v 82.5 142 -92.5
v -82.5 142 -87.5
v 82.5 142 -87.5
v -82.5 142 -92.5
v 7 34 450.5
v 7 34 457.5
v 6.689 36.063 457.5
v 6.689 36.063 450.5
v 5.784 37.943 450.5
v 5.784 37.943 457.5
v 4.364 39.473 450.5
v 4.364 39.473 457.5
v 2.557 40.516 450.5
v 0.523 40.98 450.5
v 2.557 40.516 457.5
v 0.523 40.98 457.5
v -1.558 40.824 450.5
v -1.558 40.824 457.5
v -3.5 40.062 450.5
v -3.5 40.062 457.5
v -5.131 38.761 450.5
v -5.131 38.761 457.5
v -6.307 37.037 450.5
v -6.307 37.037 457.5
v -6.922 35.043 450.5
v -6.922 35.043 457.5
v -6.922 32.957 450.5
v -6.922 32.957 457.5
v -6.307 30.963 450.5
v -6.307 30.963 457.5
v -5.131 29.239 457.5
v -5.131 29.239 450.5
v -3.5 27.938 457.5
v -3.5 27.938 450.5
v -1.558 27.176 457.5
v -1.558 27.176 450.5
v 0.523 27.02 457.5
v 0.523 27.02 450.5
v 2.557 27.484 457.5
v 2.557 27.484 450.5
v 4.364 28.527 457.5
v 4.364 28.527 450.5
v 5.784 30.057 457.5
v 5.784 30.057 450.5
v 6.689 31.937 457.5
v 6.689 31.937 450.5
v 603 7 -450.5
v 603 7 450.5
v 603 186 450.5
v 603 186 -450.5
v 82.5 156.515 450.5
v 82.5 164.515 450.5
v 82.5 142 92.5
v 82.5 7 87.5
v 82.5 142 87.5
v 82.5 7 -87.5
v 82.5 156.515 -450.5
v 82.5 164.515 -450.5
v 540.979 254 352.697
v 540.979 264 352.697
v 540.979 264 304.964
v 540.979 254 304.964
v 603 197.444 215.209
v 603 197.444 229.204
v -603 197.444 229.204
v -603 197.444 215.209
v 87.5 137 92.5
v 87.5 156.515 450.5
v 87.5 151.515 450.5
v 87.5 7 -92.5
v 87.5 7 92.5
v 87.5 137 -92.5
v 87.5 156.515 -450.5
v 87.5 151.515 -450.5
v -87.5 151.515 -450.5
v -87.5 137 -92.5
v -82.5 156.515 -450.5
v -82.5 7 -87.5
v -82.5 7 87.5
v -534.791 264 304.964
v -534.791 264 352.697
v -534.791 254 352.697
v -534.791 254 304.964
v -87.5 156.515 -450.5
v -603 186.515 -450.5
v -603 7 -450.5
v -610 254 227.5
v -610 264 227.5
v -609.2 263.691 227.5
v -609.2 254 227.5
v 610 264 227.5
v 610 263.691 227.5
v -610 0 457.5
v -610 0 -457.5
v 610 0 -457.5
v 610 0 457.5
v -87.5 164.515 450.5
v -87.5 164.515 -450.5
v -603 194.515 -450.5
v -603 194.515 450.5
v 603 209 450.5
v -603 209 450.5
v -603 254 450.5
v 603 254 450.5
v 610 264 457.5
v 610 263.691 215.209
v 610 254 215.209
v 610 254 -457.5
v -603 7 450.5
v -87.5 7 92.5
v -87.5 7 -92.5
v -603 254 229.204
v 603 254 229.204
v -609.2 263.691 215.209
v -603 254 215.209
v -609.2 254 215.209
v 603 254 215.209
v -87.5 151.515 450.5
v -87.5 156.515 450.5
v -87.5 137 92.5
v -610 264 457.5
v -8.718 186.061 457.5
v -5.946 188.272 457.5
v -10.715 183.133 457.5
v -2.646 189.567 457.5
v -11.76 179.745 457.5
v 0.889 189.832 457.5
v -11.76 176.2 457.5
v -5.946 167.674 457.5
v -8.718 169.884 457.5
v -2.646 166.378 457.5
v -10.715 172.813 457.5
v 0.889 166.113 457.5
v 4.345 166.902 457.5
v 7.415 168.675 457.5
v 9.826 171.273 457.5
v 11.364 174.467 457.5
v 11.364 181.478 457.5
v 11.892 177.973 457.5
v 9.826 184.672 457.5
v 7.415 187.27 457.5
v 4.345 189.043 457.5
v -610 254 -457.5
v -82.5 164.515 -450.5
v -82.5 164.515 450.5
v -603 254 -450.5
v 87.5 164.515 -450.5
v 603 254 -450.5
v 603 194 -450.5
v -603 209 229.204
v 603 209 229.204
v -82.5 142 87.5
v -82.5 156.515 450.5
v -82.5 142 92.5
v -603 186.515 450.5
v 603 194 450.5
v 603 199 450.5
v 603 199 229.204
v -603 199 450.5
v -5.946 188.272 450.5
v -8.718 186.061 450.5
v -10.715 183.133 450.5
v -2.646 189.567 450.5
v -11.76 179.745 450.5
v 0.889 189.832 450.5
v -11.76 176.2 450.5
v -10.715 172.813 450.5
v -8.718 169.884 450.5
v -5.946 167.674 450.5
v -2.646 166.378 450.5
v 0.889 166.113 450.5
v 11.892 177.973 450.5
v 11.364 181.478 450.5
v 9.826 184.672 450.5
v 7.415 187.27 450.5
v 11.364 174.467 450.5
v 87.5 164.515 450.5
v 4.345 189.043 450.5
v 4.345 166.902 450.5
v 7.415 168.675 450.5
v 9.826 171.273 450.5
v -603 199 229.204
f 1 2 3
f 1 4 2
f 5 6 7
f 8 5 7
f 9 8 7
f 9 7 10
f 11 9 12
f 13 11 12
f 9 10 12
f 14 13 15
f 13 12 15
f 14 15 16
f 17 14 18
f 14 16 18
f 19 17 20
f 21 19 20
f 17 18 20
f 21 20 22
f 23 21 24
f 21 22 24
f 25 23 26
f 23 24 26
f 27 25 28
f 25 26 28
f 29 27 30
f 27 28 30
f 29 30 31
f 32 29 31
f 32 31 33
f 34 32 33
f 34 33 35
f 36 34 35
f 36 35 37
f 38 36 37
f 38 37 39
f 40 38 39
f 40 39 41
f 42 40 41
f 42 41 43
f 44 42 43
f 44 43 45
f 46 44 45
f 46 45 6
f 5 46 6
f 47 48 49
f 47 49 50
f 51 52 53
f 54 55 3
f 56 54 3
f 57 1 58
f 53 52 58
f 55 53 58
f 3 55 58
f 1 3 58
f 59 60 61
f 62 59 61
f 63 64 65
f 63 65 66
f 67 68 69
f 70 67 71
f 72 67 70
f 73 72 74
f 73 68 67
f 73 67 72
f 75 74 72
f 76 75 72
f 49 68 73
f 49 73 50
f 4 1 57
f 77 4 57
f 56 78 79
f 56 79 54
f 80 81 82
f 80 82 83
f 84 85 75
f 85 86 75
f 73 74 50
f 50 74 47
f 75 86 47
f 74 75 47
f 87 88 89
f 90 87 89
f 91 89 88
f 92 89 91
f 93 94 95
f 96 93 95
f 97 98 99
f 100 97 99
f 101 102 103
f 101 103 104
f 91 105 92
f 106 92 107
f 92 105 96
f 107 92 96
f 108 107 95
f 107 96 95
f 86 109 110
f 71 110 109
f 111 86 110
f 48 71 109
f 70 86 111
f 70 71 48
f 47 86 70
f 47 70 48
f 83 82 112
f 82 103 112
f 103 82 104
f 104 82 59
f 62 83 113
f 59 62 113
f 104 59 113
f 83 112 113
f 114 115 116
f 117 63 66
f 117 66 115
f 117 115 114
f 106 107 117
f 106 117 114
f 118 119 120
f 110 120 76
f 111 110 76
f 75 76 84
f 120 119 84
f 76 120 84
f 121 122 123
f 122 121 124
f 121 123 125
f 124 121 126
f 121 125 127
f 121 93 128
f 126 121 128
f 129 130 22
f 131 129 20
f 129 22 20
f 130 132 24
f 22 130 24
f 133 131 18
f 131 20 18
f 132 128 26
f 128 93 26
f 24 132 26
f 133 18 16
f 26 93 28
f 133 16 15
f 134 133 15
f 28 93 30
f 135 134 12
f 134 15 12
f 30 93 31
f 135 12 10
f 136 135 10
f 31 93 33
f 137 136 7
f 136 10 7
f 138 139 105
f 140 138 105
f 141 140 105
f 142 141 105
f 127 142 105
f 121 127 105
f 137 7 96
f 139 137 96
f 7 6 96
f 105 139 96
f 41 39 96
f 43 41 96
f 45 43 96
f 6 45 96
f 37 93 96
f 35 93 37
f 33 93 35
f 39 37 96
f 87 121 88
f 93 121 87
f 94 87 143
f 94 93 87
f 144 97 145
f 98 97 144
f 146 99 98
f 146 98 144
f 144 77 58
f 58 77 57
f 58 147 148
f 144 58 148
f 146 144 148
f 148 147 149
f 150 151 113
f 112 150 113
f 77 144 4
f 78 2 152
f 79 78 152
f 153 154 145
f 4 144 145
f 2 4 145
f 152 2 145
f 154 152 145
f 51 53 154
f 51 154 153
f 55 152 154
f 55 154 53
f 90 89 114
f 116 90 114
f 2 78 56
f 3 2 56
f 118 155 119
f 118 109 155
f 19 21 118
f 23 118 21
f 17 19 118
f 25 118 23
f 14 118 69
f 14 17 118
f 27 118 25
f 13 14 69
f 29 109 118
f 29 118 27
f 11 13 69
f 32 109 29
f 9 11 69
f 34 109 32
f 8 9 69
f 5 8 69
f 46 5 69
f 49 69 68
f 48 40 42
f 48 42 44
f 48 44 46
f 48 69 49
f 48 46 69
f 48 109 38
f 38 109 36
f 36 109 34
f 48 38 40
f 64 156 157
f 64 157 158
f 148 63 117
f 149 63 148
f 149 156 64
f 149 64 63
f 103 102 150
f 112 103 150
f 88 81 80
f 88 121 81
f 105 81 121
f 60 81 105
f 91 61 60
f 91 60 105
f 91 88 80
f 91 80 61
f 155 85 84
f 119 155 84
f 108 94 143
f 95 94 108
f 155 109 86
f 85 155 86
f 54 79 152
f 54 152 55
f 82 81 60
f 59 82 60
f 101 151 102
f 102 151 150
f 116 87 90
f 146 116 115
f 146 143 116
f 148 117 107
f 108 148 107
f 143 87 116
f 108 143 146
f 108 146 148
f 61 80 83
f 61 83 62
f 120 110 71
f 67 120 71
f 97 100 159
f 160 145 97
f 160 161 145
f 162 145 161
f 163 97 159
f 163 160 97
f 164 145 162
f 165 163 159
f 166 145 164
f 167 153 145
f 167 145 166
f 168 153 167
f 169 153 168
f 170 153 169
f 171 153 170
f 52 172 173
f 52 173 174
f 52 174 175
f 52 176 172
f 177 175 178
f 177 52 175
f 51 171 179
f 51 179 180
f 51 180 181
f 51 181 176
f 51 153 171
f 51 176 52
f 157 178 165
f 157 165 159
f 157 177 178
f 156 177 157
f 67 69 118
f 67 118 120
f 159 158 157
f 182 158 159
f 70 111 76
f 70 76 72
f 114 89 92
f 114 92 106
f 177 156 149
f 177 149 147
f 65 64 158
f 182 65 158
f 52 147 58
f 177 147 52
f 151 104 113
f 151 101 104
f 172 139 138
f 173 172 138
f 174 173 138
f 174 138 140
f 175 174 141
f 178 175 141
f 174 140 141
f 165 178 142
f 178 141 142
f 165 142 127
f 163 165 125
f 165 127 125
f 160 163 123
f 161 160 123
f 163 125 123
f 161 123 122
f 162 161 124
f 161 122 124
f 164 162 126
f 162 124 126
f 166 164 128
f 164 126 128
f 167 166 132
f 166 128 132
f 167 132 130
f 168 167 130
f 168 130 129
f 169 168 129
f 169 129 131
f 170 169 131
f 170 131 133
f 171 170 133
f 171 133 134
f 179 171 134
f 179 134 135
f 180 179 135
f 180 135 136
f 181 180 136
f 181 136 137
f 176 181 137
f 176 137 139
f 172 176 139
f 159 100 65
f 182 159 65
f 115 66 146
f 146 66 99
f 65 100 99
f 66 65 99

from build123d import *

# Parameters (mm, degrees)
SKETCH1_W            = 1220
SKETCH1_H            = 915
BOSS_EXTRUDE1_DEPTH  = 254
SHELL1_T             = -7
BOSS_EXTRUDE2_DEPTH  = 901
SKETCH3_W            = 175
SKETCH3_H            = 185
SKETCH3_W_2          = 165
SKETCH3_H_2          = 175
BOSS_EXTRUDE3_DEPTH  = 135
BOSS_EXTRUDE4_DEPTH  = 175
BOSS_EXTRUDE5_DEPTH  = 5
BOSS_EXTRUDE6_DEPTH  = 5
SKETCH7_W            = 1220
SKETCH7_H            = 7
BOSS_EXTRUDE7_DEPTH  = 320
SKETCH8_W            = 1348.114973262
SKETCH8_H            = 350.584679525
CUT_EXTRUDE1_DEPTH   = 8
SKETCH9_R            = 7
CUT_EXTRUDE2_DEPTH   = 10
SKETCH10_W           = 1220
SKETCH10_H           = 230
BOSS_EXTRUDE8_DEPTH  = 10
SKETCH12_W           = 1206
SKETCH12_H           = 223
BOSS_EXTRUDE10_DEPTH = 10
SKETCH14_W           = 13.994838931
SKETCH14_H           = 66.246220617
BOSS_EXTRUDE13_DEPTH = 1219.2
SKETCH15_W           = 1075.77038164
SKETCH15_H           = 47.733443392
CUT_EXTRUDE3_DEPTH   = 10
SKETCH16_R           = 11.892366701
CUT_EXTRUDE4_DEPTH   = 10


with BuildPart() as part:
    # Sketch1 → Boss-Extrude1 (new body)
    with BuildSketch(Plane(origin=(0, 0, 0), x_dir=(1, 0, 0), z_dir=(0, 1, 0))):
        Rectangle(SKETCH1_W, SKETCH1_H)
    extrude(amount=BOSS_EXTRUDE1_DEPTH)

    # Shell1
    shell1_openings = [part.faces().sort_by_distance(p)[0] for p in [
        (0, 254, 0),
    ]]
    offset(amount=SHELL1_T, openings=shell1_openings, kind=Kind.INTERSECTION)

    # Sketch2 → Boss-Extrude2 (add)
    with BuildSketch(Plane.XY.offset(-450.5)):
        Polygon((-87.5, 164.514526371), (-603, 194.514526371), (-603, 186.514526371), (-87.5, 156.514526371), align=None)
        Polygon((603, 194), (87.5, 164.514526371), (87.5, 156.514526371), (603, 186), align=None)
    extrude(amount=BOSS_EXTRUDE2_DEPTH)

    # Sketch3 → Boss-Extrude3 (add)
    with BuildSketch(Plane(origin=(0, 7, 0), x_dir=(1, 0, 0), z_dir=(0, 1, 0))):
        Rectangle(SKETCH3_W, SKETCH3_H)
        Rectangle(SKETCH3_W_2, SKETCH3_H_2, mode=Mode.SUBTRACT)
    extrude(amount=BOSS_EXTRUDE3_DEPTH)

    # Sketch4 → Boss-Extrude4 (add)
    with BuildSketch(Plane.ZY.offset(-87.5)):
        Polygon((92.5, 142), (450.5, 156.514526371), (450.5, 151.514526371), (92.5, 137), align=None)
        Polygon((-92.5, 142), (-450.5, 156.514526371), (-450.5, 151.514526371), (-92.5, 137), align=None)
    extrude(amount=BOSS_EXTRUDE4_DEPTH)

    # Sketch5 → Boss-Extrude5 (add)
    with BuildSketch(Plane(origin=(-87.5, 0, 0), x_dir=(0, 0, -1), z_dir=(1, 0, 0))):
        Polygon((450.5, 164.514526371), (450.5, 156.514526371), (92.5, 142), (-92.5, 142), (-450.5, 156.514526371), (-450.5, 164.514526371), align=None)
    extrude(amount=BOSS_EXTRUDE5_DEPTH)

    # Sketch6 → Boss-Extrude6 (add)
    with BuildSketch(Plane.ZY.offset(-87.5)):
        Polygon((450.5, 164.514526371), (450.5, 156.514526371), (92.5, 142), (-92.5, 142), (-450.5, 156.514526371), (-450.5, 164.514526371), align=None)
    extrude(amount=BOSS_EXTRUDE6_DEPTH)

    # Sketch7 → Boss-Extrude7 (add)
    with BuildSketch(Plane(origin=(0, 254, 0), x_dir=(1, 0, 0), z_dir=(0, 1, 0))):
        with Locations((0, -454)):
            Rectangle(SKETCH7_W, SKETCH7_H)
    extrude(amount=BOSS_EXTRUDE7_DEPTH)

    # Sketch8 → Cut-Extrude1 (cut, through all)
    with BuildSketch(Plane(origin=(0, 0, 450.5), x_dir=(-1, 0, 0), z_dir=(0, 0, -1))):
        with Locations((-20.633408071, 430.569613213)):
            Rectangle(SKETCH8_W, SKETCH8_H)
    extrude(amount=-CUT_EXTRUDE1_DEPTH, mode=Mode.SUBTRACT)

    # Sketch9 → Cut-Extrude2 (cut)
    with BuildSketch(Plane.XY.offset(457.5)):
        with Locations((0, 34)):
            Circle(SKETCH9_R)
    extrude(amount=-CUT_EXTRUDE2_DEPTH, mode=Mode.SUBTRACT)

    # Sketch10 → Boss-Extrude8 (add)
    with BuildSketch(Plane(origin=(0, 254, 0), x_dir=(1, 0, 0), z_dir=(0, 1, 0))):
        with Locations((0, -342.5)):
            Rectangle(SKETCH10_W, SKETCH10_H)
    extrude(amount=BOSS_EXTRUDE8_DEPTH)

    # Sketch12 → Boss-Extrude10 (add)
    with BuildSketch(Plane(origin=(0, 199, 0), x_dir=(-1, 0, 0), z_dir=(0, -1, 0))):
        with Locations((0, -339)):
            Rectangle(SKETCH12_W, SKETCH12_H)
    extrude(amount=-BOSS_EXTRUDE10_DEPTH)

    # Sketch14 → Boss-Extrude13 (add)
    with BuildSketch(Plane(origin=(610, 0, 0), x_dir=(0, 0, -1), z_dir=(1, 0, 0))):
        with Locations((-222.206337189, 230.567579207)):
            Rectangle(SKETCH14_W, SKETCH14_H)
    extrude(amount=-BOSS_EXTRUDE13_DEPTH)

    # Sketch15 → Cut-Extrude3 (cut)
    with BuildSketch(Plane(origin=(0, 264, 0), x_dir=(1, 0, 0), z_dir=(0, 1, 0))):
        with Locations((3.093834294, -328.830387814)):
            Rectangle(SKETCH15_W, SKETCH15_H)
    extrude(amount=-CUT_EXTRUDE3_DEPTH, mode=Mode.SUBTRACT)

    # Sketch16 → Cut-Extrude4 (cut)
    with BuildSketch(Plane.XY.offset(457.5)):
        with Locations((0, 177.972608665)):
            Circle(SKETCH16_R)
    extrude(amount=-CUT_EXTRUDE4_DEPTH, mode=Mode.SUBTRACT)


solid = part.part
